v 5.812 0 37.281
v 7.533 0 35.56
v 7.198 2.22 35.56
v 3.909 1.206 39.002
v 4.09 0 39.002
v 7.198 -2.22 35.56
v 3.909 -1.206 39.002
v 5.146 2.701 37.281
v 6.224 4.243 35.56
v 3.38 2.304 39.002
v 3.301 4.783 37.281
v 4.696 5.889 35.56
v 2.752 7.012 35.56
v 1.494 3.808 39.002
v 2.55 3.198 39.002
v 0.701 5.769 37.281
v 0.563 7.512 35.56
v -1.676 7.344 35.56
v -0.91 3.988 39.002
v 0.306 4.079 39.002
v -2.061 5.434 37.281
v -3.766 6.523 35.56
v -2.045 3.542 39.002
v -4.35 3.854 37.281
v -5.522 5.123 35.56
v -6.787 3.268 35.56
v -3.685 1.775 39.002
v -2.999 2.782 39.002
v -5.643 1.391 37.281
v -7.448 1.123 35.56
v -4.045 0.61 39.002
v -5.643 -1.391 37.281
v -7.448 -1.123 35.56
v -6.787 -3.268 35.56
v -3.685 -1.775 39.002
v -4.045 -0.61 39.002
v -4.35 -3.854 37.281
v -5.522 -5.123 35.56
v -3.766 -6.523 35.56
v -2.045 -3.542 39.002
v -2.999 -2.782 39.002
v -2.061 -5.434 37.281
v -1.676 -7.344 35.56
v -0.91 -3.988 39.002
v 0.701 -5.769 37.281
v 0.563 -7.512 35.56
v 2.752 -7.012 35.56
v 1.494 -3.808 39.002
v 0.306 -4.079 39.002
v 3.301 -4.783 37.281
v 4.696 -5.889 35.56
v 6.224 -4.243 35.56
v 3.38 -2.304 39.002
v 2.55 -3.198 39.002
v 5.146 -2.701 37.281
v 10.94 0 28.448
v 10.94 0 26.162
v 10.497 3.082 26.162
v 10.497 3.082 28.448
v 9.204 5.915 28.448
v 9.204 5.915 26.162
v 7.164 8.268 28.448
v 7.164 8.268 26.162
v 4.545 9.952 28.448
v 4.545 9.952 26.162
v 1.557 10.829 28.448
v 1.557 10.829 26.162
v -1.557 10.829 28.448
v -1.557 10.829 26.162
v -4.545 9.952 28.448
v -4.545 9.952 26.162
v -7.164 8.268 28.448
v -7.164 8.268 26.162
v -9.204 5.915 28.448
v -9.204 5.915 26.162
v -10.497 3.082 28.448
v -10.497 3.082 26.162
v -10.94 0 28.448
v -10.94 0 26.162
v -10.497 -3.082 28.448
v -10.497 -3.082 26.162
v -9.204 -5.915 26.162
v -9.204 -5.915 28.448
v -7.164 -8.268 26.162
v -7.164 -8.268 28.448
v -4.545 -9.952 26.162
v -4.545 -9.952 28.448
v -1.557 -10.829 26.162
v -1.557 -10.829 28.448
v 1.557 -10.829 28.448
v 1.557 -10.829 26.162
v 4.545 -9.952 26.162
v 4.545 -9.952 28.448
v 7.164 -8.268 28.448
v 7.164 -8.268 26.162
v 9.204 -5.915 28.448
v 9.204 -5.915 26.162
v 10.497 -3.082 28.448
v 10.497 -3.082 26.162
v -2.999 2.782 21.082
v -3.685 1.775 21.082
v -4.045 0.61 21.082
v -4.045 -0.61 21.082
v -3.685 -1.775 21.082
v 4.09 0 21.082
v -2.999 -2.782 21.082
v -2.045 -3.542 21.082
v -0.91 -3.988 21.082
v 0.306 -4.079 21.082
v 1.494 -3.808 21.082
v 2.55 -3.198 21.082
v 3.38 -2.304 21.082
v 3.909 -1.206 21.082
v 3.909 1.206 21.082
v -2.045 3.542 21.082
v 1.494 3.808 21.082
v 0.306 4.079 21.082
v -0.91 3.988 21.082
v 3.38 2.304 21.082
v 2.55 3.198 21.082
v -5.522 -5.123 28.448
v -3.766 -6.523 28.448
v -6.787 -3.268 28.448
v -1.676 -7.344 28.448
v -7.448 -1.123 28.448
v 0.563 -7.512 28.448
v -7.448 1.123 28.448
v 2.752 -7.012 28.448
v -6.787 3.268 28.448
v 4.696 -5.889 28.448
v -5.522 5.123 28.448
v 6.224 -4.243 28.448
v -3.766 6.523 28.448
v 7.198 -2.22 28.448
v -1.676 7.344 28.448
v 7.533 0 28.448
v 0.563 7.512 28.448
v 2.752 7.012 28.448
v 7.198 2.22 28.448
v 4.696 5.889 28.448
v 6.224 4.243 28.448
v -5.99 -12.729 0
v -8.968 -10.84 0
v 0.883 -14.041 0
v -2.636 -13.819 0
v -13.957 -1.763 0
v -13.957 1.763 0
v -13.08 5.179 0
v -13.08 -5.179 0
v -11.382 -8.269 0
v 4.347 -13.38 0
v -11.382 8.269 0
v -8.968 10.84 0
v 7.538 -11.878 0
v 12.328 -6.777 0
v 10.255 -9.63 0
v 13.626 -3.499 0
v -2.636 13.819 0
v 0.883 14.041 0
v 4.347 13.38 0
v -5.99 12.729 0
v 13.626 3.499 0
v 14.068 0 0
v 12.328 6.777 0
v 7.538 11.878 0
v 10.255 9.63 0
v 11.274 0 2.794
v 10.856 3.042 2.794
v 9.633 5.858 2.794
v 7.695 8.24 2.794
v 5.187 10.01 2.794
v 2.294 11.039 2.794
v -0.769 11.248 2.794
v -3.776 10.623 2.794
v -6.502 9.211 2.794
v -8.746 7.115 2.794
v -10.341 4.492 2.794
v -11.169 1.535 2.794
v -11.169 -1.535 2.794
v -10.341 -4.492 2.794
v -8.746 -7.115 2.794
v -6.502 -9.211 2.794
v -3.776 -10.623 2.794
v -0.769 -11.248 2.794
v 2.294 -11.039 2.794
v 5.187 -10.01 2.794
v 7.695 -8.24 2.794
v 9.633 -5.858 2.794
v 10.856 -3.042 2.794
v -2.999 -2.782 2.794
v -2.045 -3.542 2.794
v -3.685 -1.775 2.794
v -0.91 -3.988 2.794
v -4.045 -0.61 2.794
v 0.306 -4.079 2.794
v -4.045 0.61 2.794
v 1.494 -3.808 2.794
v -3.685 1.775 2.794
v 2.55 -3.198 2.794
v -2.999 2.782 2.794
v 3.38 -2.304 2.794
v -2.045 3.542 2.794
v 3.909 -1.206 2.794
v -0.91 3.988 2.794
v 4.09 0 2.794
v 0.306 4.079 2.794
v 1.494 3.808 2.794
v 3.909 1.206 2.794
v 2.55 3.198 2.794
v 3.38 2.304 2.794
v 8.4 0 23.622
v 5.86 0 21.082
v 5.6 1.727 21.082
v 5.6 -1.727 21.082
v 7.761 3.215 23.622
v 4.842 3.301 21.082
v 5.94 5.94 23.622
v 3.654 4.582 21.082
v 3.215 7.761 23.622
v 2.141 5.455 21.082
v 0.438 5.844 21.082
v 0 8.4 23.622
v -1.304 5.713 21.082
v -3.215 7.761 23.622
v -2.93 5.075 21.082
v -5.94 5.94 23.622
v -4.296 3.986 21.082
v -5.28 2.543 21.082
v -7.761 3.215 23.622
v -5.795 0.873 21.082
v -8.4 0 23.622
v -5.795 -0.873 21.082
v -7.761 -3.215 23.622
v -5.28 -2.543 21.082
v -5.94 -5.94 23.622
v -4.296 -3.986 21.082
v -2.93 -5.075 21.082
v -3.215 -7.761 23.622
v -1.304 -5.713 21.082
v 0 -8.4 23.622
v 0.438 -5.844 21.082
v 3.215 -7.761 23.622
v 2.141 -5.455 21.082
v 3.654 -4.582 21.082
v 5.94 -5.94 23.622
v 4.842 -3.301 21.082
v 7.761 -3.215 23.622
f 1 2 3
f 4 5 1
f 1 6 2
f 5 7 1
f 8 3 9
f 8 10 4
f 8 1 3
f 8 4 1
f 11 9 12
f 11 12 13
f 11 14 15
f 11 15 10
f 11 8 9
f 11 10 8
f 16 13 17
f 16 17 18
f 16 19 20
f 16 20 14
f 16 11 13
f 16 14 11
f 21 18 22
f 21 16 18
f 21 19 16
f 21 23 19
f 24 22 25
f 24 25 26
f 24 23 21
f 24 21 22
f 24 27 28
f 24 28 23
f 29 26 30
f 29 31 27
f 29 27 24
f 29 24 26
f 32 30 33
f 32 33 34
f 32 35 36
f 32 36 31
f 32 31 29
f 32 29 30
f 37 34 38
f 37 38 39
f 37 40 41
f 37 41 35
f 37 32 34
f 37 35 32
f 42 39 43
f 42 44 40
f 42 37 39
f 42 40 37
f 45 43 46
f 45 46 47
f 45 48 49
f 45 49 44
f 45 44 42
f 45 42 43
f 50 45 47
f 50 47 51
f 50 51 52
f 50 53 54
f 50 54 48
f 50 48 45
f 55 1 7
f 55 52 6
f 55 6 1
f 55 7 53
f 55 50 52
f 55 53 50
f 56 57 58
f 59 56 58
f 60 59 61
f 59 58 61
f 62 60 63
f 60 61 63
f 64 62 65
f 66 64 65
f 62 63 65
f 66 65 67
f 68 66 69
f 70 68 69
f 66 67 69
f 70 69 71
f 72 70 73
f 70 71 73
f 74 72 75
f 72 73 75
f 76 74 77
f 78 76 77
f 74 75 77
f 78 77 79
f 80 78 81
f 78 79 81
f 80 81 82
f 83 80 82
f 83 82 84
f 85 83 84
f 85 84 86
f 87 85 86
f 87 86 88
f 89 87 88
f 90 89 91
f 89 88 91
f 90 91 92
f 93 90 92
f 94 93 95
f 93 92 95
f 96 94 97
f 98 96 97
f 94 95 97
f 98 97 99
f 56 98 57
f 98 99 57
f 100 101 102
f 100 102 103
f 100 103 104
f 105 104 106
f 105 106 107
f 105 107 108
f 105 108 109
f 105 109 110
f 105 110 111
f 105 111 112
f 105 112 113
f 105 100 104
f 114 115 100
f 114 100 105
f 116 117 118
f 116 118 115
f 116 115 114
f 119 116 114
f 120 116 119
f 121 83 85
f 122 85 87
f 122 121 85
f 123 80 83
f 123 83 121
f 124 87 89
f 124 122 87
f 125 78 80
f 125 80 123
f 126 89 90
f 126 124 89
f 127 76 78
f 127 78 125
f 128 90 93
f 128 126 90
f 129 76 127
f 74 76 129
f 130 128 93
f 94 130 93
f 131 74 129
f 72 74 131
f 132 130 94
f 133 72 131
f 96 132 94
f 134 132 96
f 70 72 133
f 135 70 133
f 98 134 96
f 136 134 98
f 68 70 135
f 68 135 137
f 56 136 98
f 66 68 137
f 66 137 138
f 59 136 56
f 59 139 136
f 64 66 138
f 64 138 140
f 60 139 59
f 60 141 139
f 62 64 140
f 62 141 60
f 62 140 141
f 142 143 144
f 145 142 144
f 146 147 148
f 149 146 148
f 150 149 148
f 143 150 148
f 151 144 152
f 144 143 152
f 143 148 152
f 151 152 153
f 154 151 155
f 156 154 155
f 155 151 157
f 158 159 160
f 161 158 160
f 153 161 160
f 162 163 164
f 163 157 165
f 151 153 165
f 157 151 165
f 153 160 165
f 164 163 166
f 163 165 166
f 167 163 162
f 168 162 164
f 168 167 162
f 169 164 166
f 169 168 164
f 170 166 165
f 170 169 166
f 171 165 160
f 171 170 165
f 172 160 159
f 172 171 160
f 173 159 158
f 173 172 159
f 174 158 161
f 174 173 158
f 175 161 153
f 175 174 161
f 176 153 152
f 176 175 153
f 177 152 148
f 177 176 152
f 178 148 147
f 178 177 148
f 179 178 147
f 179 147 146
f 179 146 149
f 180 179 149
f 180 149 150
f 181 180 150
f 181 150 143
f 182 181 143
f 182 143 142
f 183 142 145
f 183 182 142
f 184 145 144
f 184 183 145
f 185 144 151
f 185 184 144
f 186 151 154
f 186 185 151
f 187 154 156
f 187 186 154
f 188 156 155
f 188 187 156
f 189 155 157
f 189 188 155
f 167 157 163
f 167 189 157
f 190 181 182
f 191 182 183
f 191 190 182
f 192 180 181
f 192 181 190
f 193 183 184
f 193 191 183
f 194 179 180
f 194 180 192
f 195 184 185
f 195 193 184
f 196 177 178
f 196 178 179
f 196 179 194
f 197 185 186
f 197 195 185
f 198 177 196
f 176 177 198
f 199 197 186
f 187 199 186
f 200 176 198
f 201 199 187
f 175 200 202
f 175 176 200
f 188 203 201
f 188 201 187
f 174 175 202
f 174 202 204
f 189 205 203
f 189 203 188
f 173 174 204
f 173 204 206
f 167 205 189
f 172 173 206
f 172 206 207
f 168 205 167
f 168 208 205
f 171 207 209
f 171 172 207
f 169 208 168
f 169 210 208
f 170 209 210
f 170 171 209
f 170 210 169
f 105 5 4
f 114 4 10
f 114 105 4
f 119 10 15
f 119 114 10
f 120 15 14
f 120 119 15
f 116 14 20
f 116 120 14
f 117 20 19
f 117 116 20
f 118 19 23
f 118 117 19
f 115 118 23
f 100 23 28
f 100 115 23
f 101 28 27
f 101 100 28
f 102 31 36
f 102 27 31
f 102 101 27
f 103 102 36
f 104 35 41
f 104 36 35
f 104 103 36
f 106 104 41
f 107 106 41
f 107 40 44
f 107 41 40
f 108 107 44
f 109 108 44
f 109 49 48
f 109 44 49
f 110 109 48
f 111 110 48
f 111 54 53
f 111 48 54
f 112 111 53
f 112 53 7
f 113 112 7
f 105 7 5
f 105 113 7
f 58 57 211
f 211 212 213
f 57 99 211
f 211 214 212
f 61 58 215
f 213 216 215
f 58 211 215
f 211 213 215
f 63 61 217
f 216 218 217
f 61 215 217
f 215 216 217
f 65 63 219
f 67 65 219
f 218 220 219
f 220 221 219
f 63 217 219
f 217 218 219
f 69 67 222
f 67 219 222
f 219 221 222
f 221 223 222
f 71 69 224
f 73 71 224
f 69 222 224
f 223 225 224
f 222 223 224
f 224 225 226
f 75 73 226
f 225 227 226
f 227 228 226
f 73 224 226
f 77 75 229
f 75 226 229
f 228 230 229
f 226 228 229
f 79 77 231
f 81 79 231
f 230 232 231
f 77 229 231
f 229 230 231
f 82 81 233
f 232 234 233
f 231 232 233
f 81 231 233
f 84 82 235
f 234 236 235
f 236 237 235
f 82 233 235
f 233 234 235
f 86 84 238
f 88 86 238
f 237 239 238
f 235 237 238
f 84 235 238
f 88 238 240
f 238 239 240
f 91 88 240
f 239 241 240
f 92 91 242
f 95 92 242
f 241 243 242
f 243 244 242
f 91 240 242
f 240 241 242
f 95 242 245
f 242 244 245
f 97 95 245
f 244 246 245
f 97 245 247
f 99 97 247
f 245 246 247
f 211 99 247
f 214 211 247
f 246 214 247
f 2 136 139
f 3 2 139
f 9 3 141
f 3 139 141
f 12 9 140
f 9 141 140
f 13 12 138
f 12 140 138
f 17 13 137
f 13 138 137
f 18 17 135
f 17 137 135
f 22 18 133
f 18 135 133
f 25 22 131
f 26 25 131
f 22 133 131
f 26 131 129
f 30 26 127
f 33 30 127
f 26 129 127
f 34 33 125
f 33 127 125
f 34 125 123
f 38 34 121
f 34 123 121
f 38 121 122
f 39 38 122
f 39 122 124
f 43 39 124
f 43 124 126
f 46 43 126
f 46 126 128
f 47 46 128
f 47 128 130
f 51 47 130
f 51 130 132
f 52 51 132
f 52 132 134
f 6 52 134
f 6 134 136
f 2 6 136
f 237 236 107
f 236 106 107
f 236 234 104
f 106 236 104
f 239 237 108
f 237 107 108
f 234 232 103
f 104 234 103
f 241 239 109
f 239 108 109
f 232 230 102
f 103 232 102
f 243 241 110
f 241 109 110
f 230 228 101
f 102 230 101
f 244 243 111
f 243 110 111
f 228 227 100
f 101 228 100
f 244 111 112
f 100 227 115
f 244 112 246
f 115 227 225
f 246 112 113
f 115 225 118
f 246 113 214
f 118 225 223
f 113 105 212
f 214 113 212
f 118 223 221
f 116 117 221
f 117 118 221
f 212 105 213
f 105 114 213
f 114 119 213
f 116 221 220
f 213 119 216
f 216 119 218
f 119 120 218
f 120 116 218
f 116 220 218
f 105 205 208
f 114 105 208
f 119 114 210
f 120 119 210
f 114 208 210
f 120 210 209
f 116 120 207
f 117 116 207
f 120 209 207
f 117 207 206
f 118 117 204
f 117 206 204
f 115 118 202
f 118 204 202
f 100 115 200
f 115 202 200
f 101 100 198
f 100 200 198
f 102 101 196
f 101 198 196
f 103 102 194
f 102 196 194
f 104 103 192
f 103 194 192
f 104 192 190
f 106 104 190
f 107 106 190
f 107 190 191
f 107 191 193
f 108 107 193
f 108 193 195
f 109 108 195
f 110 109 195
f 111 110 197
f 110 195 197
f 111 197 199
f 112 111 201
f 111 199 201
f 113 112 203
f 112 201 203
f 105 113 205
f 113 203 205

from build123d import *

# Parameters (mm, degrees)
F0_R      = 16.354359017
F1_DEPTH  = 2.794
F5_R      = 4.0904887837
F6_DEPTH  = 18.288
F7_R      = 7.5325975951
F7_R_2    = 4.0904887837
F8_DEPTH  = 19.558
F10_R     = 10.9404048471
F10_R_2   = 4.0904887837
F11_DEPTH = 7.366
F12_SIZE  = 5.08


# Not quite as in the source:
# - a fillet or chamfer that OpenCascade refuses, or shapes differently, is made with other operations: its cross-section is extruded or revolved along the edge and cut away or added
# - the program builds the solid bodies; features that only make, move or delete a surface that nothing else refers to are left out


with BuildPart() as f1:
    # F0 (on Top) → F1 (new body)
    with BuildSketch(Plane.XY):
        Circle(F0_R)
    extrude(amount=F1_DEPTH)

    # F2: chamfer of 5.08 on 1 edges, made by hand

    # F2_s1 → F2_t2 (revolve, cut)
    with BuildSketch(Plane.XZ):
        Polygon((16.354359017, -2.286), (11.274359017, 2.794), (16.354359017, 2.794), align=None)
    revolve(axis=Axis((0, 0, 2.794), (0, 0, 1)), mode=Mode.SUBTRACT)

    # F5 (on face) → F6 (join)
    with BuildSketch(Plane.XY.offset(2.794)):
        Circle(F5_R)
    extrude(amount=F6_DEPTH)


with BuildPart() as f8:
    # F7 (on face) → F8 (new body)
    with BuildSketch(Plane.XY.offset(21.082)):
        Circle(F7_R)
        Circle(F7_R_2, mode=Mode.SUBTRACT)
    extrude(amount=F8_DEPTH)

    # F9: chamfer of 5.08 on 1 edges, made by hand

    # F9_s1 → F9_t2 (revolve, cut)
    with BuildSketch(Plane.XZ):
        Polygon((7.5325975951, 35.56), (2.4525975951, 40.64), (7.5325975951, 40.64), align=None)
    revolve(axis=Axis((0, 0, 40.64), (0, 0, 1)), mode=Mode.SUBTRACT)

    # F10 (on face) → F11 (join)
    with BuildSketch(Plane.XY.offset(21.082)):
        Circle(F10_R)
        Circle(F10_R_2, mode=Mode.SUBTRACT)
    extrude(amount=F11_DEPTH)

    # F12
    f12_edges = [f8.edges().sort_by_distance(p)[0] for p in [
        (-10.940405, 0, 21.082),
    ]]
    chamfer(f12_edges, length=F12_SIZE)


solid = Compound([f1.part, f8.part])
